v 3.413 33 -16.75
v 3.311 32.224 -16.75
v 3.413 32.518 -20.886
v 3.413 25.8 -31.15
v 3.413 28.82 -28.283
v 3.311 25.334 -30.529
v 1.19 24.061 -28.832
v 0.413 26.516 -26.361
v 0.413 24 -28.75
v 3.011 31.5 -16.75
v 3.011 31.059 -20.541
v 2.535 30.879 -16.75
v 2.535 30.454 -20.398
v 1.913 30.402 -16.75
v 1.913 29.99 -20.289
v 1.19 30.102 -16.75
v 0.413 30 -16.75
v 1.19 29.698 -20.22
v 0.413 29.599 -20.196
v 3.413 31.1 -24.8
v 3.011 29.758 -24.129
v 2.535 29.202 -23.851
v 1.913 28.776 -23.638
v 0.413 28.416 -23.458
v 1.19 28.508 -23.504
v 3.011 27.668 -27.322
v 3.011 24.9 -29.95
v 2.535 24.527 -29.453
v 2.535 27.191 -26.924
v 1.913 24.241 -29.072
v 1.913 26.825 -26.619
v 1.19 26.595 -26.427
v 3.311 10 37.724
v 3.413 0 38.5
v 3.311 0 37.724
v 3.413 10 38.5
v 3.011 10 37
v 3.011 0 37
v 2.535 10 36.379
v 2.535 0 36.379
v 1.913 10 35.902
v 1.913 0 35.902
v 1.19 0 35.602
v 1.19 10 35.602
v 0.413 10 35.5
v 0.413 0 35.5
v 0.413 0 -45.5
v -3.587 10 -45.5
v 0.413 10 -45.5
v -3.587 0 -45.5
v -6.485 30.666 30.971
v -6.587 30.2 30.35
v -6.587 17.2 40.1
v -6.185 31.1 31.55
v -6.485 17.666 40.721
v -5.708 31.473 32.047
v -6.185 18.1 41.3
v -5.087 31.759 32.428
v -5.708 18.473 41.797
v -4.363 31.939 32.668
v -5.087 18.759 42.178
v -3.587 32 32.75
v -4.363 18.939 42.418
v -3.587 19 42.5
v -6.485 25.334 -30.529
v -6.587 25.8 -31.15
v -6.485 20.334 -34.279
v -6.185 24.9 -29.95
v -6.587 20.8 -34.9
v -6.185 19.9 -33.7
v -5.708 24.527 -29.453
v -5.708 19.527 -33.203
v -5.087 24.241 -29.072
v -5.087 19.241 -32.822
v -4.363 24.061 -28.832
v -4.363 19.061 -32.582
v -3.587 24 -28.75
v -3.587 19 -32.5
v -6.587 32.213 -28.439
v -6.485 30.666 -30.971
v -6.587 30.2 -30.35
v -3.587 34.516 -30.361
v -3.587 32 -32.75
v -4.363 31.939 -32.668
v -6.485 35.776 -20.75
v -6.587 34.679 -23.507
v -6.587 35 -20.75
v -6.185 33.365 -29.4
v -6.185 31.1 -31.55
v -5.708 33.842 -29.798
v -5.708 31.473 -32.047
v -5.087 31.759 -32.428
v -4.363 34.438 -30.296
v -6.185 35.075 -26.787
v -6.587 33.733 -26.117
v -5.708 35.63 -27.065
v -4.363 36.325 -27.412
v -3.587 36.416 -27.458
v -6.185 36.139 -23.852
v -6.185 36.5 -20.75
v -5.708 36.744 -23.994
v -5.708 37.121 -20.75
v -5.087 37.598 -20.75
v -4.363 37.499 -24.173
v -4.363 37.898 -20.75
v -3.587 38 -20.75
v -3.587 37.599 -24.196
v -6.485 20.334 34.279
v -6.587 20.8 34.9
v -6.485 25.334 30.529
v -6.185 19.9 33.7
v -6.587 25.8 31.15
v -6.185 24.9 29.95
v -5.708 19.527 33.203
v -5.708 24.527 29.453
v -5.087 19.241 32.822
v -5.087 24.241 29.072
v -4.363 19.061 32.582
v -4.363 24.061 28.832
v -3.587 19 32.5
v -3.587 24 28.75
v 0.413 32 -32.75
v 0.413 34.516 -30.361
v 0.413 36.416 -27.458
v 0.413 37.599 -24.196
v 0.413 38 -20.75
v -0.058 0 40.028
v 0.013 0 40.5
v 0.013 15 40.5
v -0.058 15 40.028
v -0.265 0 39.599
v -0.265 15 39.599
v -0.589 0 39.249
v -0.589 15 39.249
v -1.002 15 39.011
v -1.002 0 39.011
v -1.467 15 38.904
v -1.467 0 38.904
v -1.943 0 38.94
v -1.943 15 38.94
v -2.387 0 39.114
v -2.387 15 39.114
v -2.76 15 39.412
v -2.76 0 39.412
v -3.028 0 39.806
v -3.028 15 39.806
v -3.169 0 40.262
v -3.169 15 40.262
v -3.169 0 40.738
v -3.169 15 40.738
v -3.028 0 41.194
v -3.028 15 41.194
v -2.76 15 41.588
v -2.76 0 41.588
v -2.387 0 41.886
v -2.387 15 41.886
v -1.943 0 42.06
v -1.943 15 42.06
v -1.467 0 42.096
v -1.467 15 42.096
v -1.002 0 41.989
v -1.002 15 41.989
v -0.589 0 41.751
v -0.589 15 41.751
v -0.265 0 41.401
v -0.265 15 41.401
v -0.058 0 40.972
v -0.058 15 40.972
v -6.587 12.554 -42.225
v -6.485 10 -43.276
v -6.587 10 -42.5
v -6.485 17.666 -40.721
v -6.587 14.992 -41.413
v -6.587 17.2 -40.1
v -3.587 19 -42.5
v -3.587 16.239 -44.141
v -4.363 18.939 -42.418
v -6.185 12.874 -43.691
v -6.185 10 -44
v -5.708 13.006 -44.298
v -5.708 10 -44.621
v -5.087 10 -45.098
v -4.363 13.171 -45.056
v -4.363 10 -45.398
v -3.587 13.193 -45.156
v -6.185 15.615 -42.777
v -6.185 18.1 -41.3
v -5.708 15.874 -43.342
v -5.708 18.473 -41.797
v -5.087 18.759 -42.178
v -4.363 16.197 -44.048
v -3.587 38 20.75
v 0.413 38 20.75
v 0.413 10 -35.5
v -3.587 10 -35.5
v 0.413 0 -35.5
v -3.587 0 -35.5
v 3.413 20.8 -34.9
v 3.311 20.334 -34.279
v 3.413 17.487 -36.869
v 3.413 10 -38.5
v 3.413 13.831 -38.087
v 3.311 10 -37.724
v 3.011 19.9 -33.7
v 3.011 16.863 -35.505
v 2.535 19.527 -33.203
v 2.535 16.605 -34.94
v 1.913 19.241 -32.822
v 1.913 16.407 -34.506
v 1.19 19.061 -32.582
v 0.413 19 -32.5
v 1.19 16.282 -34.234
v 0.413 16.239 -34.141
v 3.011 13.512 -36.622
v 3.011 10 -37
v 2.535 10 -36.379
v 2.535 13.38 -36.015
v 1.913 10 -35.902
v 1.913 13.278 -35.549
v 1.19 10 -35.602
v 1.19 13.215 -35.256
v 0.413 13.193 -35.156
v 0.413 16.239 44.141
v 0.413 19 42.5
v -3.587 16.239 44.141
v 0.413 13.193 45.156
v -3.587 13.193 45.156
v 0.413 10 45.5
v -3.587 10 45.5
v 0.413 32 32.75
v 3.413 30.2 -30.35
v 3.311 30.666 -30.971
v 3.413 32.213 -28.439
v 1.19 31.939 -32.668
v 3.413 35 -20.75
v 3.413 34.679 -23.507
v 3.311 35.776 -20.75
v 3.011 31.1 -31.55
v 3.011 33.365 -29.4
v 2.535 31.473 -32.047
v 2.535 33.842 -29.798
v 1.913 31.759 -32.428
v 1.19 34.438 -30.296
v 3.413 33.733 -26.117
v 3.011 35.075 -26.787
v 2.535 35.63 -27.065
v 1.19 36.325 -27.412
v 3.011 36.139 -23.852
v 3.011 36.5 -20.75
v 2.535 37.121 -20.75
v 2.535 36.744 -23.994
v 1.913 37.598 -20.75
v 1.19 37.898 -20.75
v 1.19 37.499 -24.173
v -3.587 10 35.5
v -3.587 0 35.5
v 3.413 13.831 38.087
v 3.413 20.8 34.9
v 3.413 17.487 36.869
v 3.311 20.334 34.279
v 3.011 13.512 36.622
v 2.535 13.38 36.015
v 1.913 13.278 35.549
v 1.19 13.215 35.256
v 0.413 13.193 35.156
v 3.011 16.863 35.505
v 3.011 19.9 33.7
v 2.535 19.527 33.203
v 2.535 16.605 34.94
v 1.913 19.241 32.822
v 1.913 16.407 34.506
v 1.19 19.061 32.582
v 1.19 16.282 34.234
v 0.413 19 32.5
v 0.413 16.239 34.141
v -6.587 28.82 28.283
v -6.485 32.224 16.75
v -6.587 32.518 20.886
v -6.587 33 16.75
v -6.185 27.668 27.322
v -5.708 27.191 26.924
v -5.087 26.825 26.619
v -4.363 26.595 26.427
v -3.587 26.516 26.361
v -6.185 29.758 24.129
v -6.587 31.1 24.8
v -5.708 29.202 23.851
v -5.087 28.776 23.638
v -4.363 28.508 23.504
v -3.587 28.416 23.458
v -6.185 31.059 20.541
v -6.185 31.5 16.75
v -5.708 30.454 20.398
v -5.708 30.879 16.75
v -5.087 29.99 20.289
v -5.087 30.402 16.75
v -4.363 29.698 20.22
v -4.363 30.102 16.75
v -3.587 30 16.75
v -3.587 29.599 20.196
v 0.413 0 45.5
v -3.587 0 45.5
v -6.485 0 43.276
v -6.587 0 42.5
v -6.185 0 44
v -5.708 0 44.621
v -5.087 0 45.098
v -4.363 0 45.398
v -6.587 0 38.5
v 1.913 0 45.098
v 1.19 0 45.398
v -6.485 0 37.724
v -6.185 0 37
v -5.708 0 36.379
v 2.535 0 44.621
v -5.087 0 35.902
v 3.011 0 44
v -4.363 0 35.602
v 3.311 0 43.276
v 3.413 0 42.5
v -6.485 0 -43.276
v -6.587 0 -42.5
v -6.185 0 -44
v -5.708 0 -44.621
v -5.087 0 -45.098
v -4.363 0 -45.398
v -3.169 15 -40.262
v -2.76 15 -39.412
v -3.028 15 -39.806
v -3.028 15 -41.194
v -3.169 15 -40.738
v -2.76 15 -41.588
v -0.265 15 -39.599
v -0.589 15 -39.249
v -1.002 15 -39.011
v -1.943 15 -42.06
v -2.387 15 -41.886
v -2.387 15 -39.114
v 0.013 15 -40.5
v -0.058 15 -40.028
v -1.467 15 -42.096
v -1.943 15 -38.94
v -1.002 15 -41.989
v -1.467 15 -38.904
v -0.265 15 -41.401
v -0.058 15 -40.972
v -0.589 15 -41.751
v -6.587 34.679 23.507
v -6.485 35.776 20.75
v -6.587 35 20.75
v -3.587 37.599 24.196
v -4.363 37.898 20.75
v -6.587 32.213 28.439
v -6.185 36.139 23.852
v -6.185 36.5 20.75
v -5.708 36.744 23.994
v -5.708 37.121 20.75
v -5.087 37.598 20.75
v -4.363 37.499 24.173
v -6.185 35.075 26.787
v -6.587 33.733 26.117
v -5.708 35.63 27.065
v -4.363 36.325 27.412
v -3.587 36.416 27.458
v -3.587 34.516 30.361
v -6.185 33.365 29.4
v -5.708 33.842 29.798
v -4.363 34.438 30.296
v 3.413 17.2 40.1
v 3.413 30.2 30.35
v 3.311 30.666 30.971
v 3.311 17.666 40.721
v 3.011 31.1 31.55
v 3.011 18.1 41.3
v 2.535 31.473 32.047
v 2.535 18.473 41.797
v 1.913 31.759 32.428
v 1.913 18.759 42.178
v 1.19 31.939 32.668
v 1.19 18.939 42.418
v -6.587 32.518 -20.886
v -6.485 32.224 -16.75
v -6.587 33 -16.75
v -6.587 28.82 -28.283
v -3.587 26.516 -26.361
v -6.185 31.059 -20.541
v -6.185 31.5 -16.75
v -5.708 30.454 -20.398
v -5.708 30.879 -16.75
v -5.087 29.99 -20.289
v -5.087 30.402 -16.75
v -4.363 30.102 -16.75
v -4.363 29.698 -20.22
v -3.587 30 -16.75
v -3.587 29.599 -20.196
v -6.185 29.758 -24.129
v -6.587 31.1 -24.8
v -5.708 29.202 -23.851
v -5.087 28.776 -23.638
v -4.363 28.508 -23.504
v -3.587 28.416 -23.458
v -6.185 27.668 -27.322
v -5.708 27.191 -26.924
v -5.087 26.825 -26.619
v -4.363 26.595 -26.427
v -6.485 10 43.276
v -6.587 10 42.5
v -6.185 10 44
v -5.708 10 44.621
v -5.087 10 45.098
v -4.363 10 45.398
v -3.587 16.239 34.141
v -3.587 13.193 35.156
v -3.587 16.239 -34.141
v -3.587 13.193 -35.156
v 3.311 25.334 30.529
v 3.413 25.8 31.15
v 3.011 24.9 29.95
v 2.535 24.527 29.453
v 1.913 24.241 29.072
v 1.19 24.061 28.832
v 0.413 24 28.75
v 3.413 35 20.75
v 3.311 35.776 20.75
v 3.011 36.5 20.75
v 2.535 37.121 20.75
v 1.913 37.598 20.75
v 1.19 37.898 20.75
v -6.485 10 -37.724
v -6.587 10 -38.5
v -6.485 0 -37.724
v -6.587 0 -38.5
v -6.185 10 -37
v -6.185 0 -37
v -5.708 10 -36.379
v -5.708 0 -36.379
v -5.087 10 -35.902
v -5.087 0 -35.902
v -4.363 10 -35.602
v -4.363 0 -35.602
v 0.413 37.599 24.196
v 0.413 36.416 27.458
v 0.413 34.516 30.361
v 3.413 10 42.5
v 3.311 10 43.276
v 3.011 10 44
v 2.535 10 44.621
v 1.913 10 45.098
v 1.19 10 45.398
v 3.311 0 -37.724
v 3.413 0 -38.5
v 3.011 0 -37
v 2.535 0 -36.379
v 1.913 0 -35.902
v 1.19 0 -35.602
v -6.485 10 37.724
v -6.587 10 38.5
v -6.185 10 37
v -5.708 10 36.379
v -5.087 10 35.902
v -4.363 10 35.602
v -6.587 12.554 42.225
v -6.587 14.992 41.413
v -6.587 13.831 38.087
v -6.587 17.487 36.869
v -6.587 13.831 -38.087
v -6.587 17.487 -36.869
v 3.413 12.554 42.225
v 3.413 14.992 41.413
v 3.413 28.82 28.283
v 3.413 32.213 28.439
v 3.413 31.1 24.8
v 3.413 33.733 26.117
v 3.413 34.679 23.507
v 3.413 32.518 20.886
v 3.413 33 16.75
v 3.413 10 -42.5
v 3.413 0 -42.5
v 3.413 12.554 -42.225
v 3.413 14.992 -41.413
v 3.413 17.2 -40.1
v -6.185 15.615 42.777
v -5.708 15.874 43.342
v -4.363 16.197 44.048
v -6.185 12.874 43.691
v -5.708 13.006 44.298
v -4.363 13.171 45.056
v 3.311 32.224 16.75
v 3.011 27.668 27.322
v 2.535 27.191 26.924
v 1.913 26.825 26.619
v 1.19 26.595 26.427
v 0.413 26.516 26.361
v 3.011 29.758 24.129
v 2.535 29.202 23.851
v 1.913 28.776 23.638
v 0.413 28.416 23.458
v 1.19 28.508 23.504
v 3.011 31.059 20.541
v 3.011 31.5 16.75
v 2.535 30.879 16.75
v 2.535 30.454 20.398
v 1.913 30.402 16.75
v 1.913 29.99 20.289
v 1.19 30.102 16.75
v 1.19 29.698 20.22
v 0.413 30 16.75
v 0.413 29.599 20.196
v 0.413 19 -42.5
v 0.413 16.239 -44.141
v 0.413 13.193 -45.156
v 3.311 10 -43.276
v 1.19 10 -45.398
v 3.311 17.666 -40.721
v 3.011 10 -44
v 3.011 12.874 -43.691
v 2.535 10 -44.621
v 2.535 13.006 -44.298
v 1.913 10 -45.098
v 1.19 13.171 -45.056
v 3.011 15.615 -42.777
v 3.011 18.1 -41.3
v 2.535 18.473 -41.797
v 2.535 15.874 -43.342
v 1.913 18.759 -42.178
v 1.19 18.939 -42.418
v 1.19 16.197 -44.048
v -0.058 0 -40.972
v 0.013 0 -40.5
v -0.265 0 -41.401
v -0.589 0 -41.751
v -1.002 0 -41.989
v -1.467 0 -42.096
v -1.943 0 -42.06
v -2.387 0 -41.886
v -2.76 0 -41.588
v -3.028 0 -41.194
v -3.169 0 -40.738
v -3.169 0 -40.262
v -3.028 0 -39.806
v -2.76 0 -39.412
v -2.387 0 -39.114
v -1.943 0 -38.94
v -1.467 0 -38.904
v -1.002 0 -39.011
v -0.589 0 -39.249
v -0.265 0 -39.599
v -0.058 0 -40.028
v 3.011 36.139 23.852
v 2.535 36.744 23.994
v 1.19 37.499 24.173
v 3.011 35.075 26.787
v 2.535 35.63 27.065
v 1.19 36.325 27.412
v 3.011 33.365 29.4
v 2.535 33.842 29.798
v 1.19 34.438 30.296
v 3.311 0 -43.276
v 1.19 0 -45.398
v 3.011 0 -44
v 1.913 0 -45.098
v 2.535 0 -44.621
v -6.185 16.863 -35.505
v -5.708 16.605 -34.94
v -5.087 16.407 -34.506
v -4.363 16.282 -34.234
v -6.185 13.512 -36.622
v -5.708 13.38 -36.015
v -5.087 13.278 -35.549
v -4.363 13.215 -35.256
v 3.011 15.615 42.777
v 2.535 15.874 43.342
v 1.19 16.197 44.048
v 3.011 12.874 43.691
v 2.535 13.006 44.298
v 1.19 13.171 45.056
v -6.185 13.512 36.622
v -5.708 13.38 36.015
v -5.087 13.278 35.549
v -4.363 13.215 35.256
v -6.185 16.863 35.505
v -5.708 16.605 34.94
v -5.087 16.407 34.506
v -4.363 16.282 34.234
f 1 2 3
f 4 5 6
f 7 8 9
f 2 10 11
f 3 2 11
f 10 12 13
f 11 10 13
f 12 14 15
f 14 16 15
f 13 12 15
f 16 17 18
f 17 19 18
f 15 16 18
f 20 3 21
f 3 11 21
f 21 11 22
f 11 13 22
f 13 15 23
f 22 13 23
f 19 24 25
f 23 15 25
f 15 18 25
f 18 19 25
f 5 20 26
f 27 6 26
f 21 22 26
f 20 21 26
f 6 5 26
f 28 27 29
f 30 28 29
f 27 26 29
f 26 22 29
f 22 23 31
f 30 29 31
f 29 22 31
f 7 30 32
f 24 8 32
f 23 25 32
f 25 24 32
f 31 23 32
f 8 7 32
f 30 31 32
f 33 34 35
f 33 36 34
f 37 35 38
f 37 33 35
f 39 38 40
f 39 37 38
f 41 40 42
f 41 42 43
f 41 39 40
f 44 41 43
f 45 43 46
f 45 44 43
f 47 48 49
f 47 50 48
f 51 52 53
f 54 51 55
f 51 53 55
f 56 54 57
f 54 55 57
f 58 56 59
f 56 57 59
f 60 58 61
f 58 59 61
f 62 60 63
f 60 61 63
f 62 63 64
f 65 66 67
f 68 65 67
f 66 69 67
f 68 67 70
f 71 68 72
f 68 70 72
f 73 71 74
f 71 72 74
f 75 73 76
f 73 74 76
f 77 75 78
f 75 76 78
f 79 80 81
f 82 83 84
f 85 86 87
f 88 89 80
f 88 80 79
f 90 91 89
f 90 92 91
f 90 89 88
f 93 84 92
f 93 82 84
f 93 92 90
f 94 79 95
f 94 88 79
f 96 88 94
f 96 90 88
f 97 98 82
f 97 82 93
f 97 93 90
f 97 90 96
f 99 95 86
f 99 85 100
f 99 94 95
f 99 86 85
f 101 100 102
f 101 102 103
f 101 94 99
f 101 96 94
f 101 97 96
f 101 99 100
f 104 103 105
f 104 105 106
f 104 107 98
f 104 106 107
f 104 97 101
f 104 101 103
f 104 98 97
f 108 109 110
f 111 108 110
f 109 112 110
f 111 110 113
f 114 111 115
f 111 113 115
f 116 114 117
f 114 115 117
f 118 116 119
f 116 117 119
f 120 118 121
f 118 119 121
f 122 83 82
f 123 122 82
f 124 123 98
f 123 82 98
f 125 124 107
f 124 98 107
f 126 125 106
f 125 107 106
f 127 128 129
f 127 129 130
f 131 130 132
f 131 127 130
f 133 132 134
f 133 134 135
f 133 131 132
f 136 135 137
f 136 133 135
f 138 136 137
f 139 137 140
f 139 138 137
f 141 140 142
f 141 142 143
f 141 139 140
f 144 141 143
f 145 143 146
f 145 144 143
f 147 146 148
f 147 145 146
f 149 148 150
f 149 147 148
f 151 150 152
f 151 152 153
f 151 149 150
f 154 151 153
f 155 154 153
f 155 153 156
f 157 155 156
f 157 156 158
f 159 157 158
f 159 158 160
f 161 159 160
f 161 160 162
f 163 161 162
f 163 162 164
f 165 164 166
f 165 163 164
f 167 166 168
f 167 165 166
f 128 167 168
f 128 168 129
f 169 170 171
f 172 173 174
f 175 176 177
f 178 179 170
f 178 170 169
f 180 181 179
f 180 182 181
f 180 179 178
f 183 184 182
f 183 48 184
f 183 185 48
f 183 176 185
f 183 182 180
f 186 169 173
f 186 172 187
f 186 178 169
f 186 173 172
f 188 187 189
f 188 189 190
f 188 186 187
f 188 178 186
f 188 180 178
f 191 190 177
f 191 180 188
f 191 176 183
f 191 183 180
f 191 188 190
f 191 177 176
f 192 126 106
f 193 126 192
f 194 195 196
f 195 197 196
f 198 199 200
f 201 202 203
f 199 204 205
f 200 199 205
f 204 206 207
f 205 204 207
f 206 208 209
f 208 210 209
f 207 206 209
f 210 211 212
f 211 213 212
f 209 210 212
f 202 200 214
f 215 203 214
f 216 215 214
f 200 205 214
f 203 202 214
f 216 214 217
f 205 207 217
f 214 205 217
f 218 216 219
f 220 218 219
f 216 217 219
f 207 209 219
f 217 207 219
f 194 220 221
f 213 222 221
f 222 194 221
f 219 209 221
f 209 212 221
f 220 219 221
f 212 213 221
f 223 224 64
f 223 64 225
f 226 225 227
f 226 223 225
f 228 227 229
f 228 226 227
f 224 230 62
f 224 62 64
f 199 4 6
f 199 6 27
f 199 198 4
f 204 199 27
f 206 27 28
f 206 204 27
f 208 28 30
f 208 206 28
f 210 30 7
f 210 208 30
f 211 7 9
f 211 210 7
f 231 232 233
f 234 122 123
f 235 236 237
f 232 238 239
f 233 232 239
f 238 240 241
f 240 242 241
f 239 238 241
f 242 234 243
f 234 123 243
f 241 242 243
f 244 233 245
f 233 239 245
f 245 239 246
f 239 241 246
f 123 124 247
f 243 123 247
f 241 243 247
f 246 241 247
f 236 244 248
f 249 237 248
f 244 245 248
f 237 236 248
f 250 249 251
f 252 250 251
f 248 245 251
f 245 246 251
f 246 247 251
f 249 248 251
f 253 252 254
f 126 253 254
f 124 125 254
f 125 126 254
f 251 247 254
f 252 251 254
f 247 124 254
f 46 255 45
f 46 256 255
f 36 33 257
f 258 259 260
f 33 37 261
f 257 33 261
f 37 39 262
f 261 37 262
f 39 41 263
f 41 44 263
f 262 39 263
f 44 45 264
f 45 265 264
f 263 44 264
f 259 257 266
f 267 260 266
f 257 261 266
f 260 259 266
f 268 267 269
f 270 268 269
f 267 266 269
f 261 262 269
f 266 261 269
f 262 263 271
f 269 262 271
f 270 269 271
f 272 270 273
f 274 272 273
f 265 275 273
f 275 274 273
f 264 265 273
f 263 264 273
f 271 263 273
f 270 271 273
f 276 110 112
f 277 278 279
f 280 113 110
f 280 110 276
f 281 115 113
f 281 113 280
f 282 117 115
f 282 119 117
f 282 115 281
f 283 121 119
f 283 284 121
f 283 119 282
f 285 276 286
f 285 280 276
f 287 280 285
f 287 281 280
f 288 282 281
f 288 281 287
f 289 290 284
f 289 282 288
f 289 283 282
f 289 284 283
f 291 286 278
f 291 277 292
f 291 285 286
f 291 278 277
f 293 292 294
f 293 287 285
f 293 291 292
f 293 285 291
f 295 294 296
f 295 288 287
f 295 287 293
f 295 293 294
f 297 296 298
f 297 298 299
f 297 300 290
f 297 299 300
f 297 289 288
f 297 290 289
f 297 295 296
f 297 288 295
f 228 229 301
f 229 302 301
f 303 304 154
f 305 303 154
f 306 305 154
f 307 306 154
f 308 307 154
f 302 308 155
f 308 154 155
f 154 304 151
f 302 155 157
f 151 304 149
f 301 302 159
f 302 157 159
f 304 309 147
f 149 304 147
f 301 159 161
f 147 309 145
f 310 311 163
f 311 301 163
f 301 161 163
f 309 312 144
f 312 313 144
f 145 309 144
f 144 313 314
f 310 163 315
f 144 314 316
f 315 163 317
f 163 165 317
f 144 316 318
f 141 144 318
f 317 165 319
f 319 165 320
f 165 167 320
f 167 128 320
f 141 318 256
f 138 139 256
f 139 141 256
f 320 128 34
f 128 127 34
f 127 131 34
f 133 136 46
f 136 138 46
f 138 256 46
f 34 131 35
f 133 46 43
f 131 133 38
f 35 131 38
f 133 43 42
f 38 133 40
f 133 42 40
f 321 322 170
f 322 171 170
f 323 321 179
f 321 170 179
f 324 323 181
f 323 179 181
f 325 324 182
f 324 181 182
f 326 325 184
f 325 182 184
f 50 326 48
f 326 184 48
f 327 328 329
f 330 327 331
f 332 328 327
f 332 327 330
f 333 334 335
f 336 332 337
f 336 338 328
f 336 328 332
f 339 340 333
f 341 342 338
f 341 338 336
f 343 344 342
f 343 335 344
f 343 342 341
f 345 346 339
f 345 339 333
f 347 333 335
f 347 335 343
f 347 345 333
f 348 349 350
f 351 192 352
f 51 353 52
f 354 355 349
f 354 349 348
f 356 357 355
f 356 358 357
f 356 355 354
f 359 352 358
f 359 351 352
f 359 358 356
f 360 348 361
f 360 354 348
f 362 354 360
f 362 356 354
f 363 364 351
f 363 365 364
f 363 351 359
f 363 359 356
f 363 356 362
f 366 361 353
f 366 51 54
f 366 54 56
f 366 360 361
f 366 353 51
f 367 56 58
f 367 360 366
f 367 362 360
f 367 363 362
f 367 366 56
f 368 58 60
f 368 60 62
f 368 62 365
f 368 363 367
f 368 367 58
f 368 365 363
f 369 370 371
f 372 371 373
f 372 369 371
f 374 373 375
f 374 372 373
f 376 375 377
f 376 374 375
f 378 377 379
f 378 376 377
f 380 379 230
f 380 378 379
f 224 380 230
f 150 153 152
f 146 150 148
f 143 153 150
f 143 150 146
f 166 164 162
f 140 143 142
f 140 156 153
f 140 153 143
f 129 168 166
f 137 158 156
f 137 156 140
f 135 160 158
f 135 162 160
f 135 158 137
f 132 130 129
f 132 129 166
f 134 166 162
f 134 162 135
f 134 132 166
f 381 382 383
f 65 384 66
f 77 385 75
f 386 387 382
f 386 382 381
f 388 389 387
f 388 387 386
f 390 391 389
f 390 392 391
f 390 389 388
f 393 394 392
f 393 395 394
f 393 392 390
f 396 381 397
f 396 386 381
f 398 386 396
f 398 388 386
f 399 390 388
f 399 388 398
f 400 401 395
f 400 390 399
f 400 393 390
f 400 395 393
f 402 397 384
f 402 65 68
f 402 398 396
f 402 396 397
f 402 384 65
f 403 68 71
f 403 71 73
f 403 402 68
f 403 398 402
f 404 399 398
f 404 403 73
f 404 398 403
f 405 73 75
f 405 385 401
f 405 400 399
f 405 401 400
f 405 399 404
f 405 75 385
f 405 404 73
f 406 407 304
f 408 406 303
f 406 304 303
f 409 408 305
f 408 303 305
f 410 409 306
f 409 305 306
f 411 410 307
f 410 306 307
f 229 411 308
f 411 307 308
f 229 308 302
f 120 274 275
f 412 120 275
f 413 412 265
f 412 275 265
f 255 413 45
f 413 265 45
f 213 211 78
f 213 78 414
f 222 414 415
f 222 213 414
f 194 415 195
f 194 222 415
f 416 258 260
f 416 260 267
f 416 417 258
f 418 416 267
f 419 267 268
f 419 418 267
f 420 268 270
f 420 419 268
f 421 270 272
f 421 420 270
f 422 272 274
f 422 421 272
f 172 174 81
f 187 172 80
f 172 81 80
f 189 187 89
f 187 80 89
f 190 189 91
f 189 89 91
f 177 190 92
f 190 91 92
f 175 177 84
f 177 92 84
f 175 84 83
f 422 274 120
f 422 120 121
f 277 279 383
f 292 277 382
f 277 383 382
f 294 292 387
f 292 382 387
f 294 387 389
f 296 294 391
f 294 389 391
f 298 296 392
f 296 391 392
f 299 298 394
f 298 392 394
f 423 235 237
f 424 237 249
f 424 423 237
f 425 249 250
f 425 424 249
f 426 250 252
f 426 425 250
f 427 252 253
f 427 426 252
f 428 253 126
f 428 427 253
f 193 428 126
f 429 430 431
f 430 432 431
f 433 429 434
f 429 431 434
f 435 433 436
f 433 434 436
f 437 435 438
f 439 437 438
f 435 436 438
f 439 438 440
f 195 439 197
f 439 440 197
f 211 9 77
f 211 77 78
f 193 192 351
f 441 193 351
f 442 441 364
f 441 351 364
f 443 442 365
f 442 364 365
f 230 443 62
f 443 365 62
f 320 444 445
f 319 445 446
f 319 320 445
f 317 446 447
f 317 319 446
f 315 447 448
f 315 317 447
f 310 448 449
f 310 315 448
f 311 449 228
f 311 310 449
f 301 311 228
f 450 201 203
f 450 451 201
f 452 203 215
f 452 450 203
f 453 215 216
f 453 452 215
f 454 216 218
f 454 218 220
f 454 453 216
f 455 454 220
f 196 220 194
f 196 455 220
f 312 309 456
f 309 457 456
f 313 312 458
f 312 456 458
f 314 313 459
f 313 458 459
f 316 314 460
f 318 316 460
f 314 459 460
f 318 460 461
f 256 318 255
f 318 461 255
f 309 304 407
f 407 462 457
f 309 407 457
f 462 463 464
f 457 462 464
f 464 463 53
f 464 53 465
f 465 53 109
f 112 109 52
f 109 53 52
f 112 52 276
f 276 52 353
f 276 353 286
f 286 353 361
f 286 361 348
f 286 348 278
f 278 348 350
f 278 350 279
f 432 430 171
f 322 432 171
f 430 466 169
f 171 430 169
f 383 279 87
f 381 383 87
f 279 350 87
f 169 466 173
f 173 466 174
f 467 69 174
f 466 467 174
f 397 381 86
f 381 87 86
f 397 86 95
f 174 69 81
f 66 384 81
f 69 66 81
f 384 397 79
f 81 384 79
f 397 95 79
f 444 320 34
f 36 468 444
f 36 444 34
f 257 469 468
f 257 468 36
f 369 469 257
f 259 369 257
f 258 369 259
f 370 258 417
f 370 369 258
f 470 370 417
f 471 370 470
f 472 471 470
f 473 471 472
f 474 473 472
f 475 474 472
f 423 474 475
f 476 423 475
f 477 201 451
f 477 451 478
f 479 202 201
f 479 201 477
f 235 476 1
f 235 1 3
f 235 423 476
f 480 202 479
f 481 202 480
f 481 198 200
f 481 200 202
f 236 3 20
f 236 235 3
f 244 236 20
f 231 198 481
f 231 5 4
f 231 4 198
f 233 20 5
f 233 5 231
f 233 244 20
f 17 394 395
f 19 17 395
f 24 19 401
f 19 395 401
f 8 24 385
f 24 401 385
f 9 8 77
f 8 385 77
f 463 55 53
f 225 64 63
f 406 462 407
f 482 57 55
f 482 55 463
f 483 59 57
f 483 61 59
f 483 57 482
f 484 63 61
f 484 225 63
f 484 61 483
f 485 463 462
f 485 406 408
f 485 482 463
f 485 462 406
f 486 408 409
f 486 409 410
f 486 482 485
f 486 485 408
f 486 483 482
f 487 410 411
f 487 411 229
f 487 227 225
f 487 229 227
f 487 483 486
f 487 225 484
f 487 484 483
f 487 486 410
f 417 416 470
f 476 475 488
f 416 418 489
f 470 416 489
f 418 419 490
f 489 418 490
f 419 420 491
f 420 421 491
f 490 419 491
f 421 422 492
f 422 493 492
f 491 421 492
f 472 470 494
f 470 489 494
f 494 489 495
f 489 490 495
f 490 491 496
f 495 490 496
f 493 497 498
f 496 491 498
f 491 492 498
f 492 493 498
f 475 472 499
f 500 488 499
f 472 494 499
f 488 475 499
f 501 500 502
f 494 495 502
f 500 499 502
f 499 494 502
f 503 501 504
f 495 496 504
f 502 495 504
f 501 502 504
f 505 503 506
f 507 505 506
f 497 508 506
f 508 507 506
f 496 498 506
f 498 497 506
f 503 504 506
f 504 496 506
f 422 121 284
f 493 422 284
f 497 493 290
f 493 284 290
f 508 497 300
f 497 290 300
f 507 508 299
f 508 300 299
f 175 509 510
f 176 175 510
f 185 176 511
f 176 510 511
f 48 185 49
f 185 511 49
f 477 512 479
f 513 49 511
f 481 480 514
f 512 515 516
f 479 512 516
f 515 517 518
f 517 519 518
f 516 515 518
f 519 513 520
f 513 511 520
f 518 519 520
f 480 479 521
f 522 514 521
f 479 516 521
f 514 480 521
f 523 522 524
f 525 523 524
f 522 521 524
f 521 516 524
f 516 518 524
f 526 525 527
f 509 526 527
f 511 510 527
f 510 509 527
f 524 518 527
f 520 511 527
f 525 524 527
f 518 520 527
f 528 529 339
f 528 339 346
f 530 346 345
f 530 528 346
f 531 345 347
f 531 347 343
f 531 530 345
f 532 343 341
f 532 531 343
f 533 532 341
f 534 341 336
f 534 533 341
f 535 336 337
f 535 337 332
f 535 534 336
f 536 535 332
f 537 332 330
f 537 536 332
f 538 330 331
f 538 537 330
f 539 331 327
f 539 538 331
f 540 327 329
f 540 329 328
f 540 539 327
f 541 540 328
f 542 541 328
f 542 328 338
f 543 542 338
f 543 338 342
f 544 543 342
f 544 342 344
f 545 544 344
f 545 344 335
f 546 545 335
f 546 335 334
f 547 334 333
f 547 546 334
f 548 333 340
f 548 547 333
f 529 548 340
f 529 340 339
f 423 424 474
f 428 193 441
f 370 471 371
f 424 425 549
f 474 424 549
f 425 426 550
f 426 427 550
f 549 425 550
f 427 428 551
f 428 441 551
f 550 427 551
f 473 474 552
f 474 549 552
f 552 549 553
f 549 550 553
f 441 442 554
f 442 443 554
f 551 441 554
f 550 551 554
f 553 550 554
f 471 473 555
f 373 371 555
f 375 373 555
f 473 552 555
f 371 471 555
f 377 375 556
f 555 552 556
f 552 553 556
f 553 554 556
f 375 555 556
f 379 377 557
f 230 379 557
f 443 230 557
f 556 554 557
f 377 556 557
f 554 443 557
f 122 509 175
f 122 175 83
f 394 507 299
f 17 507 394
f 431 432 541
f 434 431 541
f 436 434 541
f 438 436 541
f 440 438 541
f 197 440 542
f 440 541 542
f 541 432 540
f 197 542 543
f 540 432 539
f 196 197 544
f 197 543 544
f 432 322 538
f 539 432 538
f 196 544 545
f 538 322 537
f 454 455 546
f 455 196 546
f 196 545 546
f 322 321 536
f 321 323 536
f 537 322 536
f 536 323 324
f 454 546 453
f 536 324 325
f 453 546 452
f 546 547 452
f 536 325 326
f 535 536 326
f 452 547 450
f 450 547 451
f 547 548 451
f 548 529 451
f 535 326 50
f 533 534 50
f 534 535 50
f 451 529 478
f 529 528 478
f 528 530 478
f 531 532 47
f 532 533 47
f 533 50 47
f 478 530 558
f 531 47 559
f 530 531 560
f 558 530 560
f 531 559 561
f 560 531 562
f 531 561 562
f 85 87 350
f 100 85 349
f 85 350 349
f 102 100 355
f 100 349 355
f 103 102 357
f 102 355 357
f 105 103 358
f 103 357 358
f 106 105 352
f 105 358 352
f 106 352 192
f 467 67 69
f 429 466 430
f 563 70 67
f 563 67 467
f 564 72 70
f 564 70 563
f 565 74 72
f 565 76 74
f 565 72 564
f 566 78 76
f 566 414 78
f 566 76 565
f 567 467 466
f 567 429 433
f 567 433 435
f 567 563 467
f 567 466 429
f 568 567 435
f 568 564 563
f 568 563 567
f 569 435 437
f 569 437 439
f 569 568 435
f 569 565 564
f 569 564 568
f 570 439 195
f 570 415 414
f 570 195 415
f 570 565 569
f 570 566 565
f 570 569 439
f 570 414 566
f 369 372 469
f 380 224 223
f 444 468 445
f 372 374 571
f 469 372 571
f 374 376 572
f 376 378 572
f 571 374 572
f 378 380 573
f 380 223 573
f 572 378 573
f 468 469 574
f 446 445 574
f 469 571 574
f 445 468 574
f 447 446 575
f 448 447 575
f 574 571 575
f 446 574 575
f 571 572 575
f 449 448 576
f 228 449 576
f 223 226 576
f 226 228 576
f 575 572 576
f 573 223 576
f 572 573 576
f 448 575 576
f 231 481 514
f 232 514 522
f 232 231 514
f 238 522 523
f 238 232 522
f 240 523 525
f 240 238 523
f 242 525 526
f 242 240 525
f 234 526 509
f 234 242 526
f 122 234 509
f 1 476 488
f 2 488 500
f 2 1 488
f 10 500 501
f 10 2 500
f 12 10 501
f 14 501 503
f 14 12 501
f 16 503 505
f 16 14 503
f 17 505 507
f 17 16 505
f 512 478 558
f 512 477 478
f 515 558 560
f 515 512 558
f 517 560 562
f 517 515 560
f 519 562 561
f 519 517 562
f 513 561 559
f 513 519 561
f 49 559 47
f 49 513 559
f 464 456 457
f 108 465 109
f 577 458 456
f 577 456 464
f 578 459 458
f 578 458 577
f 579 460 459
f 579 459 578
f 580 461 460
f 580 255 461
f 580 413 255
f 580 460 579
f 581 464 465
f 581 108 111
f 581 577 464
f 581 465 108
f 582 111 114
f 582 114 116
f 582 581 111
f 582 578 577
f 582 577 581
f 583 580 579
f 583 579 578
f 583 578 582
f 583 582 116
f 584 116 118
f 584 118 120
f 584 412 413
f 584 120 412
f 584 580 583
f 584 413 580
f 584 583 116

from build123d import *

# Parameters (mm, degrees)
SKETCH1_W             = 10
SKETCH1_H             = 10
SKETCH1_R             = 1.6
BOSS_EXTRUDE1_DEPTH   = 15
BOSS_EXTRUDE1_2_DEPTH = 15
BOSS_EXTRUDE2_DEPTH   = 10
FILLET1_R             = 15
FILLET2_R             = 3


with BuildPart() as part:
    # Sketch1 → Boss-Extrude1 (new body)
    with BuildSketch(Plane(origin=(0, 0, 0), x_dir=(1, 0, 0), z_dir=(0, 1, 0))):
        with Locations((-1.586813187, 40.5)):
            Rectangle(SKETCH1_W, SKETCH1_H)
        with Locations((-1.586813187, 40.5)):
            Circle(SKETCH1_R, mode=Mode.SUBTRACT)
    extrude(amount=BOSS_EXTRUDE1_DEPTH)



with BuildPart() as body_2:
    # Sketch1 → Boss-Extrude1 2 (new body)
    with BuildSketch(Plane(origin=(0, 0, 0), x_dir=(1, 0, 0), z_dir=(0, 1, 0))):
        with Locations((-1.586813187, -40.5)):
            Rectangle(SKETCH1_W, SKETCH1_H)
        with Locations((-1.586813187, -40.5)):
            Circle(SKETCH1_R, mode=Mode.SUBTRACT)
    extrude(amount=BOSS_EXTRUDE1_2_DEPTH)


with BuildPart() as part_1:
    add(part.part)

    add(body_2.part)  # Boss-Extrude2 merges body 2
    # Sketch4 → Boss-Extrude2 (add)
    with BuildSketch(Plane(origin=(3.413186813, 0, 0), x_dir=(0, 0, -1), z_dir=(1, 0, 0))):
        Polygon((-35.5, 15), (-24.25, 30), (24.25, 30), (35.5, 15), (45.5, 15), (28.25, 38), (-28.25, 38), (-45.5, 15), align=None)
    extrude(amount=-BOSS_EXTRUDE2_DEPTH)

    # Fillet1
    fillet1_edges = [part_1.edges().sort_by_distance(p)[0] for p in [
        (-1.586813187, 15, -35.5),
        (-1.586813187, 15, 35.5),
        (-1.586813187, 15, 45.5),
        (-1.586813187, 38, 28.25),
        (-1.586813187, 38, -28.25),
        (-1.586813187, 30, -24.25),
        (-1.586813187, 30, 24.25),
        (-1.586813187, 15, -45.5),
    ]]
    fillet(fillet1_edges, radius=FILLET1_R)

    # Fillet2
    fillet2_edges = [part_1.edges().sort_by_distance(p)[0] for p in [
        (-6.586813187, 5, 35.5),
        (3.413186813, 5, 35.5),
        (3.413186813, 21.5, 30.625),
        (-6.586813187, 21.5, 30.625),
        (3.413186813, 25.5, 37.625),
        (-6.586813187, 25.5, 37.625),
        (3.413186813, 5, -45.5),
        (3.413186813, 25.5, -37.625),
        (3.413186813, 38, 0),
        (3.413186813, 5, 45.5),
        (3.413186813, 30, 0),
        (3.413186813, 21.5, -30.625),
        (3.413186813, 5, -35.5),
        (3.413186813, 36.416407865, -27.458203932),
        (3.413186813, 14.74341649, -44.730249471),
        (3.413186813, 36.416407865, 27.458203932),
        (3.413186813, 14.74341649, 44.730249471),
        (-6.586813187, 5, 45.5),
        (-6.586813187, 5, -35.5),
        (-6.586813187, 21.5, -30.625),
        (-6.586813187, 30, 0),
        (-6.586813187, 38, 0),
        (-6.586813187, 25.5, -37.625),
        (-6.586813187, 5, -45.5),
        (-6.586813187, 36.416407865, -27.458203932),
        (-6.586813187, 14.74341649, -44.730249471),
        (-6.586813187, 36.416407865, 27.458203932),
        (-6.586813187, 14.74341649, 44.730249471),
        (3.413186813, 14.74341649, 34.730249471),
        (-6.586813187, 14.74341649, 34.730249471),
        (3.413186813, 28.416407865, 23.458203932),
        (-6.586813187, 28.416407865, 23.458203932),
        (3.413186813, 28.416407865, -23.458203932),
        (-6.586813187, 28.416407865, -23.458203932),
        (3.413186813, 14.74341649, -34.730249471),
        (-6.586813187, 14.74341649, -34.730249471),
    ]]
    fillet(fillet2_edges, radius=FILLET2_R)


solid = part_1.part
